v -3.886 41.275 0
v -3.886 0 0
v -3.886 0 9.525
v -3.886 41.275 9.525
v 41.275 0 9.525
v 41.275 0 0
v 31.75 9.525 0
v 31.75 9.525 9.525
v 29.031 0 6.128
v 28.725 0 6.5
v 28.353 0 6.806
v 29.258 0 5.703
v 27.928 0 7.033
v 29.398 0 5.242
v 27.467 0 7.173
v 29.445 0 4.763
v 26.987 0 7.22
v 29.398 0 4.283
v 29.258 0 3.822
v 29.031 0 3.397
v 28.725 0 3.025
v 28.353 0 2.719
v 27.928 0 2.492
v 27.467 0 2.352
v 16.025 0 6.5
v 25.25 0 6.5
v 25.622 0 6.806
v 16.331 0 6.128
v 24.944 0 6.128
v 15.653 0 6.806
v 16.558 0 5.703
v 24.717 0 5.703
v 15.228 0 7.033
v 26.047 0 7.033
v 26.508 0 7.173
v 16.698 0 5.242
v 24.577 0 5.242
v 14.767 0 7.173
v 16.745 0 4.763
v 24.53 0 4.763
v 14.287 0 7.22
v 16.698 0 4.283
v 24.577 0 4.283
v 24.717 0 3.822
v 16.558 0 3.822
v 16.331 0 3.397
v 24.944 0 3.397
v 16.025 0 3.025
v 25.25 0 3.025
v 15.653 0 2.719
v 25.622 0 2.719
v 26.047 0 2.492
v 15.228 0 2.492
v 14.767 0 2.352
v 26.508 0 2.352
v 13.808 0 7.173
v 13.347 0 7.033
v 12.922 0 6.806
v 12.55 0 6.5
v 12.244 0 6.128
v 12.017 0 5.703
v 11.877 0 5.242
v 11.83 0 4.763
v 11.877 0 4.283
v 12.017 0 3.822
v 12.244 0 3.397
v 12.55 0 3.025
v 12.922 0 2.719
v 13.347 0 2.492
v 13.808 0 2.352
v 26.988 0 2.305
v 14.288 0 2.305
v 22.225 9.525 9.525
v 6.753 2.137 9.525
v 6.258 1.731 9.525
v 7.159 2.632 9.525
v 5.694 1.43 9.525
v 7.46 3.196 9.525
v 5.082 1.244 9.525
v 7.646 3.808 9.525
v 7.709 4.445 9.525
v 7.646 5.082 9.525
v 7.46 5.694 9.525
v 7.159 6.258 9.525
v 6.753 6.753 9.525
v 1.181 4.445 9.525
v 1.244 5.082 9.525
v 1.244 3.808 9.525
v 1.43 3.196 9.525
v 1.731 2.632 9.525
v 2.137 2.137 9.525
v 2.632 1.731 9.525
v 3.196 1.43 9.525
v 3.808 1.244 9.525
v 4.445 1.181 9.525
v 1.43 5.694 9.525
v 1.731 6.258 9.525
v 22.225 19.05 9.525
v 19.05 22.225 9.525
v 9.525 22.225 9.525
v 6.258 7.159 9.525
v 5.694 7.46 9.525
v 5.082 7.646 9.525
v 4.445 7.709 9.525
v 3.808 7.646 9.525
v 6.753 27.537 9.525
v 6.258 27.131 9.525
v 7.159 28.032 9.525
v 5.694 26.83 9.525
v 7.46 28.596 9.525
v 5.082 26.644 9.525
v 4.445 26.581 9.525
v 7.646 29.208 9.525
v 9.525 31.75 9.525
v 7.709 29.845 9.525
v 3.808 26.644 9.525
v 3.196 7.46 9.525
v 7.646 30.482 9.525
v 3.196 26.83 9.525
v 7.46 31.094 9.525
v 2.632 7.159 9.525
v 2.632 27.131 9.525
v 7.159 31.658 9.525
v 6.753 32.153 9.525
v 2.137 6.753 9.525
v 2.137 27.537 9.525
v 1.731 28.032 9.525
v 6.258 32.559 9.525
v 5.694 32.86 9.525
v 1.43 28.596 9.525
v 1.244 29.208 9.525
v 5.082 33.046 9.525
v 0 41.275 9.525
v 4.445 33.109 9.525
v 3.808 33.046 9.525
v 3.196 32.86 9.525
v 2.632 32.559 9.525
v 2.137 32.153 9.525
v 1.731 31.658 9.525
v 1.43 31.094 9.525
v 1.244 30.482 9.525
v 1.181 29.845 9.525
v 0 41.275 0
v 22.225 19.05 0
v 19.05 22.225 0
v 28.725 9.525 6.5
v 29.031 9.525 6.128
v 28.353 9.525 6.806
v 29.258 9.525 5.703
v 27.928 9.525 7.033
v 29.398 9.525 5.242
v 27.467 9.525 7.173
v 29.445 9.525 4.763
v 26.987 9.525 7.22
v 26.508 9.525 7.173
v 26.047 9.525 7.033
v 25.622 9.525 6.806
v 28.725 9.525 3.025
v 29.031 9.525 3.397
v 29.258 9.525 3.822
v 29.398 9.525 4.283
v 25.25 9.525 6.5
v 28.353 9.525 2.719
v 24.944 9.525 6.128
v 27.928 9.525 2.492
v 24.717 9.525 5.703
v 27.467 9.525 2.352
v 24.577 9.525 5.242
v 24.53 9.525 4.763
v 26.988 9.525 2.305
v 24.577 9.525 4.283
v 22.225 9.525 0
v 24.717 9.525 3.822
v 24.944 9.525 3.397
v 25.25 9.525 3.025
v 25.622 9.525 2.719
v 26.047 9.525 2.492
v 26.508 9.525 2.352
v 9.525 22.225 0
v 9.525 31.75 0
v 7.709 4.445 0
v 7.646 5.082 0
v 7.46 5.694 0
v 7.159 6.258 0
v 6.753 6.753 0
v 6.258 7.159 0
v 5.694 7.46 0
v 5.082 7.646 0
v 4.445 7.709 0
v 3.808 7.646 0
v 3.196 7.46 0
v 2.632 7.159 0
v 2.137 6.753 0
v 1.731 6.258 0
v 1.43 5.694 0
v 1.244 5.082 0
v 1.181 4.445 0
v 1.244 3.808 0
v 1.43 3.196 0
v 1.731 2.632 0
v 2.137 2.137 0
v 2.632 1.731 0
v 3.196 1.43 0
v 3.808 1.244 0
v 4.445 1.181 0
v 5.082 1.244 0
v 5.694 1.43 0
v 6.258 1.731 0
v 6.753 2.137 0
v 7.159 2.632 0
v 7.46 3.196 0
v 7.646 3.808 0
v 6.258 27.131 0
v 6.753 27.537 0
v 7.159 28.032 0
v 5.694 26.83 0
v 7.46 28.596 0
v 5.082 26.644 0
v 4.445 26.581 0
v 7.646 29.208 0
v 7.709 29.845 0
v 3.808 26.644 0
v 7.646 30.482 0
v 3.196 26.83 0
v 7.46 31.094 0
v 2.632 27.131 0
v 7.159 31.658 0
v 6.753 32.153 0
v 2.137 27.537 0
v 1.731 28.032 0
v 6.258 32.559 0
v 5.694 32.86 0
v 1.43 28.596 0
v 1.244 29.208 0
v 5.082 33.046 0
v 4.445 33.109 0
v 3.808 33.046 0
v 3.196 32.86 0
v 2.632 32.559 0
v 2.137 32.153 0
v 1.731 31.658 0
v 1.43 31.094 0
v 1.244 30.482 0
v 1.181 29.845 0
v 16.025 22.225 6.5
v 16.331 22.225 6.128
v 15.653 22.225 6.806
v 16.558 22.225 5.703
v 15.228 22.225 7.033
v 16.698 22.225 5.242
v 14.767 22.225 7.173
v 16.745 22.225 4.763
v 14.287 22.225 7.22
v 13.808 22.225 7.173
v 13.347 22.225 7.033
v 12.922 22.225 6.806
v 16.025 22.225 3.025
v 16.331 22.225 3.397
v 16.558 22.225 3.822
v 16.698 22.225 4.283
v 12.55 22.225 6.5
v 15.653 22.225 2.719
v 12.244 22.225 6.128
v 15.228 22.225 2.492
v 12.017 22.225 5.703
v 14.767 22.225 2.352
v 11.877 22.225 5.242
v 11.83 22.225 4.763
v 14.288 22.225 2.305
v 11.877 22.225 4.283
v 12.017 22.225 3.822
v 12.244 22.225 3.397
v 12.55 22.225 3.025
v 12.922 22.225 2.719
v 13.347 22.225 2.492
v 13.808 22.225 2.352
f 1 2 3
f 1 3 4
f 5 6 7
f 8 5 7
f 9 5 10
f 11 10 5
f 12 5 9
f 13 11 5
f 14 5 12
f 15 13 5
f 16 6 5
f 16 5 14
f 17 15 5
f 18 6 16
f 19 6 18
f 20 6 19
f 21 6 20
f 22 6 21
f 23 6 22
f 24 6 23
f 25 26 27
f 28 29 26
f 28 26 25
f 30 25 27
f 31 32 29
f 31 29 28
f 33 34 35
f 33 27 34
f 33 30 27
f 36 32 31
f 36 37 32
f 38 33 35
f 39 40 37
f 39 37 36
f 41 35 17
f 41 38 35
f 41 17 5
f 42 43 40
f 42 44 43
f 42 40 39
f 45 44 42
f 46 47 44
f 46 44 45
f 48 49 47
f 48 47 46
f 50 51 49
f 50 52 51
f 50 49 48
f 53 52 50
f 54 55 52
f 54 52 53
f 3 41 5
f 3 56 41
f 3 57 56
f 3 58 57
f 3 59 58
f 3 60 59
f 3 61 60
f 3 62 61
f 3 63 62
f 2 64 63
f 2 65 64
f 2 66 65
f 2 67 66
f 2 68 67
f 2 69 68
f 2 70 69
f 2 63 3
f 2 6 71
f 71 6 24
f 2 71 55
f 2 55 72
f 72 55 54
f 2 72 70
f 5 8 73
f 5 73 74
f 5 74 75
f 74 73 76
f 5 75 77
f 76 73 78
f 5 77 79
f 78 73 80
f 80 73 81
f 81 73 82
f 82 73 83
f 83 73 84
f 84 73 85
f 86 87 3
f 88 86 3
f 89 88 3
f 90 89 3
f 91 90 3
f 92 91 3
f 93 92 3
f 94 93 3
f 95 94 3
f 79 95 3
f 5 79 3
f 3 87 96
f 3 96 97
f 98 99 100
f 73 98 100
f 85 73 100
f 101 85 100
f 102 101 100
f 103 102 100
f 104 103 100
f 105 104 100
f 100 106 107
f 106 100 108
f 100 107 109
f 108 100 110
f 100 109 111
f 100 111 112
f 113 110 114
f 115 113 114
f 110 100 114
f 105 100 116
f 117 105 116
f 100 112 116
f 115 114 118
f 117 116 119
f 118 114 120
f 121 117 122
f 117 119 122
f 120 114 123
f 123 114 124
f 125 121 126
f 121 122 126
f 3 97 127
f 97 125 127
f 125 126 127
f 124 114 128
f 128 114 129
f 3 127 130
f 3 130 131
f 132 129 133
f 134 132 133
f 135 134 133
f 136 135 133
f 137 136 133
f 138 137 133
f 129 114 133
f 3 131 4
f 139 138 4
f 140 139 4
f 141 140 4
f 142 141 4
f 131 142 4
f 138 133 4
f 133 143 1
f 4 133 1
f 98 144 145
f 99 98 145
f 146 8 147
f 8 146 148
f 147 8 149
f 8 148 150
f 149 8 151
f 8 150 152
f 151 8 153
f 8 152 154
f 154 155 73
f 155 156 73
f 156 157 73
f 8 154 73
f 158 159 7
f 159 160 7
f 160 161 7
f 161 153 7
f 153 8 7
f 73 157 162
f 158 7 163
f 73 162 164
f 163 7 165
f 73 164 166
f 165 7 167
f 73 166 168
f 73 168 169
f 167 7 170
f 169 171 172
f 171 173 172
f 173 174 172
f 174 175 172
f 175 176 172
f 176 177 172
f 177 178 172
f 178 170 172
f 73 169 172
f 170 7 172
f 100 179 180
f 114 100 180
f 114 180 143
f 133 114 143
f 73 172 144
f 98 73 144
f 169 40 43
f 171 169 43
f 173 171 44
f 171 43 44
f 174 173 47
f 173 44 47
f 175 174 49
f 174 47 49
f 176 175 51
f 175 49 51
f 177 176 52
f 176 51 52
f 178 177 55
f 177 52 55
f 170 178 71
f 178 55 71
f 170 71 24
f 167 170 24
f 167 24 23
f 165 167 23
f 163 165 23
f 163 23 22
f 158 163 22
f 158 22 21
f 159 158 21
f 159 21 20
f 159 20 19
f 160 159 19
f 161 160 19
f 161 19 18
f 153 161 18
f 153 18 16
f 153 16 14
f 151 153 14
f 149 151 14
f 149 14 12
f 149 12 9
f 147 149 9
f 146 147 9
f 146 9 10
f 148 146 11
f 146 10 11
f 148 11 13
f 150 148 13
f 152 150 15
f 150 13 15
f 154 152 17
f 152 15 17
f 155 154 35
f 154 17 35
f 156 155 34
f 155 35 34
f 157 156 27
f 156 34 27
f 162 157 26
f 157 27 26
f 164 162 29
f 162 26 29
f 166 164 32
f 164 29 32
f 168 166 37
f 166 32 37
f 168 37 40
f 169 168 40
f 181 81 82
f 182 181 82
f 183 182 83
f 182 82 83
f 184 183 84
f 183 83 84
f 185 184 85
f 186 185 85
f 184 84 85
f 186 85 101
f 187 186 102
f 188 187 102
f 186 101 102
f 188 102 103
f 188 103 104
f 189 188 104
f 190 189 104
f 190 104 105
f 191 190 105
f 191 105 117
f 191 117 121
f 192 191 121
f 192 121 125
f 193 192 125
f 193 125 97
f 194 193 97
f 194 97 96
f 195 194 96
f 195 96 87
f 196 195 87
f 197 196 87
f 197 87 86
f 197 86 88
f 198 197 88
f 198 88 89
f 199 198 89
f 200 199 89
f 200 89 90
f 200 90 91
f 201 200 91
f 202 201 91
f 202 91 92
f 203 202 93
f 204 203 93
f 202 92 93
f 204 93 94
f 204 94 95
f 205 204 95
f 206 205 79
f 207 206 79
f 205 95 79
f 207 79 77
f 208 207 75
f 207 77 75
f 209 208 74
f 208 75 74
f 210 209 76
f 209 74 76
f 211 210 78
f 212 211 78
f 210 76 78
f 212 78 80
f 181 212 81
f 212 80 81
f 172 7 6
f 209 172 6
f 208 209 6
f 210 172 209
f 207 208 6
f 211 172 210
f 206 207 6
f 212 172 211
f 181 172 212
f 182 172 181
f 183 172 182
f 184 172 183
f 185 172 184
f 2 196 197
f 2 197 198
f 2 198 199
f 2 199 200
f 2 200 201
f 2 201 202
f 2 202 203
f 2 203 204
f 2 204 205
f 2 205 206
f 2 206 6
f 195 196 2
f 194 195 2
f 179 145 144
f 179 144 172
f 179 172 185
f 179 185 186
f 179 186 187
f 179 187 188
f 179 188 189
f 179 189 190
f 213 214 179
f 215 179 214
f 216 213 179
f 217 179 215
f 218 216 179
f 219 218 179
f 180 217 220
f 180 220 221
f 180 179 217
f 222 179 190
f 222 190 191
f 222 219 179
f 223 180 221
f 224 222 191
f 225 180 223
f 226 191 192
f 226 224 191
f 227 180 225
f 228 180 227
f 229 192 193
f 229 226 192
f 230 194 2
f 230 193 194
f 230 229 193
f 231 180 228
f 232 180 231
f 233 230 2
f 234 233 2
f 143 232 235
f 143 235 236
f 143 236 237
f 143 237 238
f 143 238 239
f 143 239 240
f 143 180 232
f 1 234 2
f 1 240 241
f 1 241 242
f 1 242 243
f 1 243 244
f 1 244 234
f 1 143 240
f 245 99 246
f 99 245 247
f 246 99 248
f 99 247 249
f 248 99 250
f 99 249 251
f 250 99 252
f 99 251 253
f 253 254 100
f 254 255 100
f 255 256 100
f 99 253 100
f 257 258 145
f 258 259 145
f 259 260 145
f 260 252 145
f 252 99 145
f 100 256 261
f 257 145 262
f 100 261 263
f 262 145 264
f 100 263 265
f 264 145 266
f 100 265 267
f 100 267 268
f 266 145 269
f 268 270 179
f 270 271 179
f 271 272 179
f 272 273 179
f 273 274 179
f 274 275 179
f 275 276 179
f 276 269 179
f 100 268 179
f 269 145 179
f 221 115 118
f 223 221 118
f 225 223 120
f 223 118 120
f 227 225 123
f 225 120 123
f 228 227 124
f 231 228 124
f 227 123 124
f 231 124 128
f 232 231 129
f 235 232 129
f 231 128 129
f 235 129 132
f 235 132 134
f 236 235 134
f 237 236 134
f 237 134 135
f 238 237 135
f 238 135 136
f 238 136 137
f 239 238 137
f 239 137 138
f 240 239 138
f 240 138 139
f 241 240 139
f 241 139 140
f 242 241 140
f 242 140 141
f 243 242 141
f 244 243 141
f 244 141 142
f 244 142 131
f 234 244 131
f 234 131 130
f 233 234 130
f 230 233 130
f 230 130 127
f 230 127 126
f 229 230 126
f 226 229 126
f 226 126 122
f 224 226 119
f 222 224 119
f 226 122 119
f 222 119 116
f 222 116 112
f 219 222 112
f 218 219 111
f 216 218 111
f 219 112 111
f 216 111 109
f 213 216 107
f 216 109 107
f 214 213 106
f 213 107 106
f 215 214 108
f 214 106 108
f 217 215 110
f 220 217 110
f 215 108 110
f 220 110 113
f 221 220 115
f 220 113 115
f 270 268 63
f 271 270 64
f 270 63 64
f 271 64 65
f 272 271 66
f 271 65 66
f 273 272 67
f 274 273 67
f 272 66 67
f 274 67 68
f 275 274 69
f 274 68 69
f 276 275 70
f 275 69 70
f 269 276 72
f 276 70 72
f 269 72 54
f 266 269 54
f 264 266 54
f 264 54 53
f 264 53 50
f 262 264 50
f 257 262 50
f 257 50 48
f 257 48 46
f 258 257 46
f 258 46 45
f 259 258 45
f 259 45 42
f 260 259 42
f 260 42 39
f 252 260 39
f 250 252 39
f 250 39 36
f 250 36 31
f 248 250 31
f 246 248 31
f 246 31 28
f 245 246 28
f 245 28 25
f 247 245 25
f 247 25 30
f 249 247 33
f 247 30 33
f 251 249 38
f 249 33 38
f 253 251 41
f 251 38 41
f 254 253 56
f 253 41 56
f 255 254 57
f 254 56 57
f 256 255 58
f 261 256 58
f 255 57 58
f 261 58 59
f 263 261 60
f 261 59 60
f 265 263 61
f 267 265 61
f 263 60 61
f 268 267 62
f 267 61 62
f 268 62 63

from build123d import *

# Parameters (mm, degrees)
BOSS_EXTRUDE1_DEPTH          = 9.525
SKETCH3_R                    = 3.2639
CUT_EXTRUDE1_DEPTH           = 60.143696832
SKETCH4_W                    = 3.8862
SKETCH4_H                    = 41.275
BOSS_EXTRUDE2_DEPTH          = 9.525
F_10_0_1935_DIAMETER_HOLE1_D = 4.9149


with BuildPart() as part:
    # Sketch2 → Boss-Extrude1 (new body)
    with BuildSketch(Plane.XY):
        Polygon((0, 0), (41.275, 0), (31.75, 9.525), (22.225, 9.525), (22.225, 19.05), (19.05, 22.225), (9.525, 22.225), (9.525, 31.75), (0, 41.275), align=None)
    extrude(amount=BOSS_EXTRUDE1_DEPTH)

    # Sketch3 → Cut-Extrude1 (cut, through all)
    with BuildSketch(Plane.XY.offset(9.525)):
        with Locations((4.445, 29.845)):
            Circle(SKETCH3_R)
        with Locations((4.445, 4.445)):
            Circle(SKETCH3_R)
    extrude(amount=-CUT_EXTRUDE1_DEPTH, mode=Mode.SUBTRACT)

    # Sketch4 → Boss-Extrude2 (add)
    with BuildSketch(Plane(origin=(0, 0, 0), x_dir=(-1, 0, 0), z_dir=(0, 0, -1))):
        with Locations((1.9431, 20.6375)):
            Rectangle(SKETCH4_W, SKETCH4_H)
    extrude(amount=-BOSS_EXTRUDE2_DEPTH)

    # #10 (0.1935) Diameter Hole1 (through all)
    with Locations(Plane(origin=(0, 22.225, 0), x_dir=(1, 0, 0), z_dir=(0, 1, 0))):
        with Locations((14.2875, -4.7625), (26.9875, -4.7625)):
            Hole(F_10_0_1935_DIAMETER_HOLE1_D / 2)


solid = part.part
